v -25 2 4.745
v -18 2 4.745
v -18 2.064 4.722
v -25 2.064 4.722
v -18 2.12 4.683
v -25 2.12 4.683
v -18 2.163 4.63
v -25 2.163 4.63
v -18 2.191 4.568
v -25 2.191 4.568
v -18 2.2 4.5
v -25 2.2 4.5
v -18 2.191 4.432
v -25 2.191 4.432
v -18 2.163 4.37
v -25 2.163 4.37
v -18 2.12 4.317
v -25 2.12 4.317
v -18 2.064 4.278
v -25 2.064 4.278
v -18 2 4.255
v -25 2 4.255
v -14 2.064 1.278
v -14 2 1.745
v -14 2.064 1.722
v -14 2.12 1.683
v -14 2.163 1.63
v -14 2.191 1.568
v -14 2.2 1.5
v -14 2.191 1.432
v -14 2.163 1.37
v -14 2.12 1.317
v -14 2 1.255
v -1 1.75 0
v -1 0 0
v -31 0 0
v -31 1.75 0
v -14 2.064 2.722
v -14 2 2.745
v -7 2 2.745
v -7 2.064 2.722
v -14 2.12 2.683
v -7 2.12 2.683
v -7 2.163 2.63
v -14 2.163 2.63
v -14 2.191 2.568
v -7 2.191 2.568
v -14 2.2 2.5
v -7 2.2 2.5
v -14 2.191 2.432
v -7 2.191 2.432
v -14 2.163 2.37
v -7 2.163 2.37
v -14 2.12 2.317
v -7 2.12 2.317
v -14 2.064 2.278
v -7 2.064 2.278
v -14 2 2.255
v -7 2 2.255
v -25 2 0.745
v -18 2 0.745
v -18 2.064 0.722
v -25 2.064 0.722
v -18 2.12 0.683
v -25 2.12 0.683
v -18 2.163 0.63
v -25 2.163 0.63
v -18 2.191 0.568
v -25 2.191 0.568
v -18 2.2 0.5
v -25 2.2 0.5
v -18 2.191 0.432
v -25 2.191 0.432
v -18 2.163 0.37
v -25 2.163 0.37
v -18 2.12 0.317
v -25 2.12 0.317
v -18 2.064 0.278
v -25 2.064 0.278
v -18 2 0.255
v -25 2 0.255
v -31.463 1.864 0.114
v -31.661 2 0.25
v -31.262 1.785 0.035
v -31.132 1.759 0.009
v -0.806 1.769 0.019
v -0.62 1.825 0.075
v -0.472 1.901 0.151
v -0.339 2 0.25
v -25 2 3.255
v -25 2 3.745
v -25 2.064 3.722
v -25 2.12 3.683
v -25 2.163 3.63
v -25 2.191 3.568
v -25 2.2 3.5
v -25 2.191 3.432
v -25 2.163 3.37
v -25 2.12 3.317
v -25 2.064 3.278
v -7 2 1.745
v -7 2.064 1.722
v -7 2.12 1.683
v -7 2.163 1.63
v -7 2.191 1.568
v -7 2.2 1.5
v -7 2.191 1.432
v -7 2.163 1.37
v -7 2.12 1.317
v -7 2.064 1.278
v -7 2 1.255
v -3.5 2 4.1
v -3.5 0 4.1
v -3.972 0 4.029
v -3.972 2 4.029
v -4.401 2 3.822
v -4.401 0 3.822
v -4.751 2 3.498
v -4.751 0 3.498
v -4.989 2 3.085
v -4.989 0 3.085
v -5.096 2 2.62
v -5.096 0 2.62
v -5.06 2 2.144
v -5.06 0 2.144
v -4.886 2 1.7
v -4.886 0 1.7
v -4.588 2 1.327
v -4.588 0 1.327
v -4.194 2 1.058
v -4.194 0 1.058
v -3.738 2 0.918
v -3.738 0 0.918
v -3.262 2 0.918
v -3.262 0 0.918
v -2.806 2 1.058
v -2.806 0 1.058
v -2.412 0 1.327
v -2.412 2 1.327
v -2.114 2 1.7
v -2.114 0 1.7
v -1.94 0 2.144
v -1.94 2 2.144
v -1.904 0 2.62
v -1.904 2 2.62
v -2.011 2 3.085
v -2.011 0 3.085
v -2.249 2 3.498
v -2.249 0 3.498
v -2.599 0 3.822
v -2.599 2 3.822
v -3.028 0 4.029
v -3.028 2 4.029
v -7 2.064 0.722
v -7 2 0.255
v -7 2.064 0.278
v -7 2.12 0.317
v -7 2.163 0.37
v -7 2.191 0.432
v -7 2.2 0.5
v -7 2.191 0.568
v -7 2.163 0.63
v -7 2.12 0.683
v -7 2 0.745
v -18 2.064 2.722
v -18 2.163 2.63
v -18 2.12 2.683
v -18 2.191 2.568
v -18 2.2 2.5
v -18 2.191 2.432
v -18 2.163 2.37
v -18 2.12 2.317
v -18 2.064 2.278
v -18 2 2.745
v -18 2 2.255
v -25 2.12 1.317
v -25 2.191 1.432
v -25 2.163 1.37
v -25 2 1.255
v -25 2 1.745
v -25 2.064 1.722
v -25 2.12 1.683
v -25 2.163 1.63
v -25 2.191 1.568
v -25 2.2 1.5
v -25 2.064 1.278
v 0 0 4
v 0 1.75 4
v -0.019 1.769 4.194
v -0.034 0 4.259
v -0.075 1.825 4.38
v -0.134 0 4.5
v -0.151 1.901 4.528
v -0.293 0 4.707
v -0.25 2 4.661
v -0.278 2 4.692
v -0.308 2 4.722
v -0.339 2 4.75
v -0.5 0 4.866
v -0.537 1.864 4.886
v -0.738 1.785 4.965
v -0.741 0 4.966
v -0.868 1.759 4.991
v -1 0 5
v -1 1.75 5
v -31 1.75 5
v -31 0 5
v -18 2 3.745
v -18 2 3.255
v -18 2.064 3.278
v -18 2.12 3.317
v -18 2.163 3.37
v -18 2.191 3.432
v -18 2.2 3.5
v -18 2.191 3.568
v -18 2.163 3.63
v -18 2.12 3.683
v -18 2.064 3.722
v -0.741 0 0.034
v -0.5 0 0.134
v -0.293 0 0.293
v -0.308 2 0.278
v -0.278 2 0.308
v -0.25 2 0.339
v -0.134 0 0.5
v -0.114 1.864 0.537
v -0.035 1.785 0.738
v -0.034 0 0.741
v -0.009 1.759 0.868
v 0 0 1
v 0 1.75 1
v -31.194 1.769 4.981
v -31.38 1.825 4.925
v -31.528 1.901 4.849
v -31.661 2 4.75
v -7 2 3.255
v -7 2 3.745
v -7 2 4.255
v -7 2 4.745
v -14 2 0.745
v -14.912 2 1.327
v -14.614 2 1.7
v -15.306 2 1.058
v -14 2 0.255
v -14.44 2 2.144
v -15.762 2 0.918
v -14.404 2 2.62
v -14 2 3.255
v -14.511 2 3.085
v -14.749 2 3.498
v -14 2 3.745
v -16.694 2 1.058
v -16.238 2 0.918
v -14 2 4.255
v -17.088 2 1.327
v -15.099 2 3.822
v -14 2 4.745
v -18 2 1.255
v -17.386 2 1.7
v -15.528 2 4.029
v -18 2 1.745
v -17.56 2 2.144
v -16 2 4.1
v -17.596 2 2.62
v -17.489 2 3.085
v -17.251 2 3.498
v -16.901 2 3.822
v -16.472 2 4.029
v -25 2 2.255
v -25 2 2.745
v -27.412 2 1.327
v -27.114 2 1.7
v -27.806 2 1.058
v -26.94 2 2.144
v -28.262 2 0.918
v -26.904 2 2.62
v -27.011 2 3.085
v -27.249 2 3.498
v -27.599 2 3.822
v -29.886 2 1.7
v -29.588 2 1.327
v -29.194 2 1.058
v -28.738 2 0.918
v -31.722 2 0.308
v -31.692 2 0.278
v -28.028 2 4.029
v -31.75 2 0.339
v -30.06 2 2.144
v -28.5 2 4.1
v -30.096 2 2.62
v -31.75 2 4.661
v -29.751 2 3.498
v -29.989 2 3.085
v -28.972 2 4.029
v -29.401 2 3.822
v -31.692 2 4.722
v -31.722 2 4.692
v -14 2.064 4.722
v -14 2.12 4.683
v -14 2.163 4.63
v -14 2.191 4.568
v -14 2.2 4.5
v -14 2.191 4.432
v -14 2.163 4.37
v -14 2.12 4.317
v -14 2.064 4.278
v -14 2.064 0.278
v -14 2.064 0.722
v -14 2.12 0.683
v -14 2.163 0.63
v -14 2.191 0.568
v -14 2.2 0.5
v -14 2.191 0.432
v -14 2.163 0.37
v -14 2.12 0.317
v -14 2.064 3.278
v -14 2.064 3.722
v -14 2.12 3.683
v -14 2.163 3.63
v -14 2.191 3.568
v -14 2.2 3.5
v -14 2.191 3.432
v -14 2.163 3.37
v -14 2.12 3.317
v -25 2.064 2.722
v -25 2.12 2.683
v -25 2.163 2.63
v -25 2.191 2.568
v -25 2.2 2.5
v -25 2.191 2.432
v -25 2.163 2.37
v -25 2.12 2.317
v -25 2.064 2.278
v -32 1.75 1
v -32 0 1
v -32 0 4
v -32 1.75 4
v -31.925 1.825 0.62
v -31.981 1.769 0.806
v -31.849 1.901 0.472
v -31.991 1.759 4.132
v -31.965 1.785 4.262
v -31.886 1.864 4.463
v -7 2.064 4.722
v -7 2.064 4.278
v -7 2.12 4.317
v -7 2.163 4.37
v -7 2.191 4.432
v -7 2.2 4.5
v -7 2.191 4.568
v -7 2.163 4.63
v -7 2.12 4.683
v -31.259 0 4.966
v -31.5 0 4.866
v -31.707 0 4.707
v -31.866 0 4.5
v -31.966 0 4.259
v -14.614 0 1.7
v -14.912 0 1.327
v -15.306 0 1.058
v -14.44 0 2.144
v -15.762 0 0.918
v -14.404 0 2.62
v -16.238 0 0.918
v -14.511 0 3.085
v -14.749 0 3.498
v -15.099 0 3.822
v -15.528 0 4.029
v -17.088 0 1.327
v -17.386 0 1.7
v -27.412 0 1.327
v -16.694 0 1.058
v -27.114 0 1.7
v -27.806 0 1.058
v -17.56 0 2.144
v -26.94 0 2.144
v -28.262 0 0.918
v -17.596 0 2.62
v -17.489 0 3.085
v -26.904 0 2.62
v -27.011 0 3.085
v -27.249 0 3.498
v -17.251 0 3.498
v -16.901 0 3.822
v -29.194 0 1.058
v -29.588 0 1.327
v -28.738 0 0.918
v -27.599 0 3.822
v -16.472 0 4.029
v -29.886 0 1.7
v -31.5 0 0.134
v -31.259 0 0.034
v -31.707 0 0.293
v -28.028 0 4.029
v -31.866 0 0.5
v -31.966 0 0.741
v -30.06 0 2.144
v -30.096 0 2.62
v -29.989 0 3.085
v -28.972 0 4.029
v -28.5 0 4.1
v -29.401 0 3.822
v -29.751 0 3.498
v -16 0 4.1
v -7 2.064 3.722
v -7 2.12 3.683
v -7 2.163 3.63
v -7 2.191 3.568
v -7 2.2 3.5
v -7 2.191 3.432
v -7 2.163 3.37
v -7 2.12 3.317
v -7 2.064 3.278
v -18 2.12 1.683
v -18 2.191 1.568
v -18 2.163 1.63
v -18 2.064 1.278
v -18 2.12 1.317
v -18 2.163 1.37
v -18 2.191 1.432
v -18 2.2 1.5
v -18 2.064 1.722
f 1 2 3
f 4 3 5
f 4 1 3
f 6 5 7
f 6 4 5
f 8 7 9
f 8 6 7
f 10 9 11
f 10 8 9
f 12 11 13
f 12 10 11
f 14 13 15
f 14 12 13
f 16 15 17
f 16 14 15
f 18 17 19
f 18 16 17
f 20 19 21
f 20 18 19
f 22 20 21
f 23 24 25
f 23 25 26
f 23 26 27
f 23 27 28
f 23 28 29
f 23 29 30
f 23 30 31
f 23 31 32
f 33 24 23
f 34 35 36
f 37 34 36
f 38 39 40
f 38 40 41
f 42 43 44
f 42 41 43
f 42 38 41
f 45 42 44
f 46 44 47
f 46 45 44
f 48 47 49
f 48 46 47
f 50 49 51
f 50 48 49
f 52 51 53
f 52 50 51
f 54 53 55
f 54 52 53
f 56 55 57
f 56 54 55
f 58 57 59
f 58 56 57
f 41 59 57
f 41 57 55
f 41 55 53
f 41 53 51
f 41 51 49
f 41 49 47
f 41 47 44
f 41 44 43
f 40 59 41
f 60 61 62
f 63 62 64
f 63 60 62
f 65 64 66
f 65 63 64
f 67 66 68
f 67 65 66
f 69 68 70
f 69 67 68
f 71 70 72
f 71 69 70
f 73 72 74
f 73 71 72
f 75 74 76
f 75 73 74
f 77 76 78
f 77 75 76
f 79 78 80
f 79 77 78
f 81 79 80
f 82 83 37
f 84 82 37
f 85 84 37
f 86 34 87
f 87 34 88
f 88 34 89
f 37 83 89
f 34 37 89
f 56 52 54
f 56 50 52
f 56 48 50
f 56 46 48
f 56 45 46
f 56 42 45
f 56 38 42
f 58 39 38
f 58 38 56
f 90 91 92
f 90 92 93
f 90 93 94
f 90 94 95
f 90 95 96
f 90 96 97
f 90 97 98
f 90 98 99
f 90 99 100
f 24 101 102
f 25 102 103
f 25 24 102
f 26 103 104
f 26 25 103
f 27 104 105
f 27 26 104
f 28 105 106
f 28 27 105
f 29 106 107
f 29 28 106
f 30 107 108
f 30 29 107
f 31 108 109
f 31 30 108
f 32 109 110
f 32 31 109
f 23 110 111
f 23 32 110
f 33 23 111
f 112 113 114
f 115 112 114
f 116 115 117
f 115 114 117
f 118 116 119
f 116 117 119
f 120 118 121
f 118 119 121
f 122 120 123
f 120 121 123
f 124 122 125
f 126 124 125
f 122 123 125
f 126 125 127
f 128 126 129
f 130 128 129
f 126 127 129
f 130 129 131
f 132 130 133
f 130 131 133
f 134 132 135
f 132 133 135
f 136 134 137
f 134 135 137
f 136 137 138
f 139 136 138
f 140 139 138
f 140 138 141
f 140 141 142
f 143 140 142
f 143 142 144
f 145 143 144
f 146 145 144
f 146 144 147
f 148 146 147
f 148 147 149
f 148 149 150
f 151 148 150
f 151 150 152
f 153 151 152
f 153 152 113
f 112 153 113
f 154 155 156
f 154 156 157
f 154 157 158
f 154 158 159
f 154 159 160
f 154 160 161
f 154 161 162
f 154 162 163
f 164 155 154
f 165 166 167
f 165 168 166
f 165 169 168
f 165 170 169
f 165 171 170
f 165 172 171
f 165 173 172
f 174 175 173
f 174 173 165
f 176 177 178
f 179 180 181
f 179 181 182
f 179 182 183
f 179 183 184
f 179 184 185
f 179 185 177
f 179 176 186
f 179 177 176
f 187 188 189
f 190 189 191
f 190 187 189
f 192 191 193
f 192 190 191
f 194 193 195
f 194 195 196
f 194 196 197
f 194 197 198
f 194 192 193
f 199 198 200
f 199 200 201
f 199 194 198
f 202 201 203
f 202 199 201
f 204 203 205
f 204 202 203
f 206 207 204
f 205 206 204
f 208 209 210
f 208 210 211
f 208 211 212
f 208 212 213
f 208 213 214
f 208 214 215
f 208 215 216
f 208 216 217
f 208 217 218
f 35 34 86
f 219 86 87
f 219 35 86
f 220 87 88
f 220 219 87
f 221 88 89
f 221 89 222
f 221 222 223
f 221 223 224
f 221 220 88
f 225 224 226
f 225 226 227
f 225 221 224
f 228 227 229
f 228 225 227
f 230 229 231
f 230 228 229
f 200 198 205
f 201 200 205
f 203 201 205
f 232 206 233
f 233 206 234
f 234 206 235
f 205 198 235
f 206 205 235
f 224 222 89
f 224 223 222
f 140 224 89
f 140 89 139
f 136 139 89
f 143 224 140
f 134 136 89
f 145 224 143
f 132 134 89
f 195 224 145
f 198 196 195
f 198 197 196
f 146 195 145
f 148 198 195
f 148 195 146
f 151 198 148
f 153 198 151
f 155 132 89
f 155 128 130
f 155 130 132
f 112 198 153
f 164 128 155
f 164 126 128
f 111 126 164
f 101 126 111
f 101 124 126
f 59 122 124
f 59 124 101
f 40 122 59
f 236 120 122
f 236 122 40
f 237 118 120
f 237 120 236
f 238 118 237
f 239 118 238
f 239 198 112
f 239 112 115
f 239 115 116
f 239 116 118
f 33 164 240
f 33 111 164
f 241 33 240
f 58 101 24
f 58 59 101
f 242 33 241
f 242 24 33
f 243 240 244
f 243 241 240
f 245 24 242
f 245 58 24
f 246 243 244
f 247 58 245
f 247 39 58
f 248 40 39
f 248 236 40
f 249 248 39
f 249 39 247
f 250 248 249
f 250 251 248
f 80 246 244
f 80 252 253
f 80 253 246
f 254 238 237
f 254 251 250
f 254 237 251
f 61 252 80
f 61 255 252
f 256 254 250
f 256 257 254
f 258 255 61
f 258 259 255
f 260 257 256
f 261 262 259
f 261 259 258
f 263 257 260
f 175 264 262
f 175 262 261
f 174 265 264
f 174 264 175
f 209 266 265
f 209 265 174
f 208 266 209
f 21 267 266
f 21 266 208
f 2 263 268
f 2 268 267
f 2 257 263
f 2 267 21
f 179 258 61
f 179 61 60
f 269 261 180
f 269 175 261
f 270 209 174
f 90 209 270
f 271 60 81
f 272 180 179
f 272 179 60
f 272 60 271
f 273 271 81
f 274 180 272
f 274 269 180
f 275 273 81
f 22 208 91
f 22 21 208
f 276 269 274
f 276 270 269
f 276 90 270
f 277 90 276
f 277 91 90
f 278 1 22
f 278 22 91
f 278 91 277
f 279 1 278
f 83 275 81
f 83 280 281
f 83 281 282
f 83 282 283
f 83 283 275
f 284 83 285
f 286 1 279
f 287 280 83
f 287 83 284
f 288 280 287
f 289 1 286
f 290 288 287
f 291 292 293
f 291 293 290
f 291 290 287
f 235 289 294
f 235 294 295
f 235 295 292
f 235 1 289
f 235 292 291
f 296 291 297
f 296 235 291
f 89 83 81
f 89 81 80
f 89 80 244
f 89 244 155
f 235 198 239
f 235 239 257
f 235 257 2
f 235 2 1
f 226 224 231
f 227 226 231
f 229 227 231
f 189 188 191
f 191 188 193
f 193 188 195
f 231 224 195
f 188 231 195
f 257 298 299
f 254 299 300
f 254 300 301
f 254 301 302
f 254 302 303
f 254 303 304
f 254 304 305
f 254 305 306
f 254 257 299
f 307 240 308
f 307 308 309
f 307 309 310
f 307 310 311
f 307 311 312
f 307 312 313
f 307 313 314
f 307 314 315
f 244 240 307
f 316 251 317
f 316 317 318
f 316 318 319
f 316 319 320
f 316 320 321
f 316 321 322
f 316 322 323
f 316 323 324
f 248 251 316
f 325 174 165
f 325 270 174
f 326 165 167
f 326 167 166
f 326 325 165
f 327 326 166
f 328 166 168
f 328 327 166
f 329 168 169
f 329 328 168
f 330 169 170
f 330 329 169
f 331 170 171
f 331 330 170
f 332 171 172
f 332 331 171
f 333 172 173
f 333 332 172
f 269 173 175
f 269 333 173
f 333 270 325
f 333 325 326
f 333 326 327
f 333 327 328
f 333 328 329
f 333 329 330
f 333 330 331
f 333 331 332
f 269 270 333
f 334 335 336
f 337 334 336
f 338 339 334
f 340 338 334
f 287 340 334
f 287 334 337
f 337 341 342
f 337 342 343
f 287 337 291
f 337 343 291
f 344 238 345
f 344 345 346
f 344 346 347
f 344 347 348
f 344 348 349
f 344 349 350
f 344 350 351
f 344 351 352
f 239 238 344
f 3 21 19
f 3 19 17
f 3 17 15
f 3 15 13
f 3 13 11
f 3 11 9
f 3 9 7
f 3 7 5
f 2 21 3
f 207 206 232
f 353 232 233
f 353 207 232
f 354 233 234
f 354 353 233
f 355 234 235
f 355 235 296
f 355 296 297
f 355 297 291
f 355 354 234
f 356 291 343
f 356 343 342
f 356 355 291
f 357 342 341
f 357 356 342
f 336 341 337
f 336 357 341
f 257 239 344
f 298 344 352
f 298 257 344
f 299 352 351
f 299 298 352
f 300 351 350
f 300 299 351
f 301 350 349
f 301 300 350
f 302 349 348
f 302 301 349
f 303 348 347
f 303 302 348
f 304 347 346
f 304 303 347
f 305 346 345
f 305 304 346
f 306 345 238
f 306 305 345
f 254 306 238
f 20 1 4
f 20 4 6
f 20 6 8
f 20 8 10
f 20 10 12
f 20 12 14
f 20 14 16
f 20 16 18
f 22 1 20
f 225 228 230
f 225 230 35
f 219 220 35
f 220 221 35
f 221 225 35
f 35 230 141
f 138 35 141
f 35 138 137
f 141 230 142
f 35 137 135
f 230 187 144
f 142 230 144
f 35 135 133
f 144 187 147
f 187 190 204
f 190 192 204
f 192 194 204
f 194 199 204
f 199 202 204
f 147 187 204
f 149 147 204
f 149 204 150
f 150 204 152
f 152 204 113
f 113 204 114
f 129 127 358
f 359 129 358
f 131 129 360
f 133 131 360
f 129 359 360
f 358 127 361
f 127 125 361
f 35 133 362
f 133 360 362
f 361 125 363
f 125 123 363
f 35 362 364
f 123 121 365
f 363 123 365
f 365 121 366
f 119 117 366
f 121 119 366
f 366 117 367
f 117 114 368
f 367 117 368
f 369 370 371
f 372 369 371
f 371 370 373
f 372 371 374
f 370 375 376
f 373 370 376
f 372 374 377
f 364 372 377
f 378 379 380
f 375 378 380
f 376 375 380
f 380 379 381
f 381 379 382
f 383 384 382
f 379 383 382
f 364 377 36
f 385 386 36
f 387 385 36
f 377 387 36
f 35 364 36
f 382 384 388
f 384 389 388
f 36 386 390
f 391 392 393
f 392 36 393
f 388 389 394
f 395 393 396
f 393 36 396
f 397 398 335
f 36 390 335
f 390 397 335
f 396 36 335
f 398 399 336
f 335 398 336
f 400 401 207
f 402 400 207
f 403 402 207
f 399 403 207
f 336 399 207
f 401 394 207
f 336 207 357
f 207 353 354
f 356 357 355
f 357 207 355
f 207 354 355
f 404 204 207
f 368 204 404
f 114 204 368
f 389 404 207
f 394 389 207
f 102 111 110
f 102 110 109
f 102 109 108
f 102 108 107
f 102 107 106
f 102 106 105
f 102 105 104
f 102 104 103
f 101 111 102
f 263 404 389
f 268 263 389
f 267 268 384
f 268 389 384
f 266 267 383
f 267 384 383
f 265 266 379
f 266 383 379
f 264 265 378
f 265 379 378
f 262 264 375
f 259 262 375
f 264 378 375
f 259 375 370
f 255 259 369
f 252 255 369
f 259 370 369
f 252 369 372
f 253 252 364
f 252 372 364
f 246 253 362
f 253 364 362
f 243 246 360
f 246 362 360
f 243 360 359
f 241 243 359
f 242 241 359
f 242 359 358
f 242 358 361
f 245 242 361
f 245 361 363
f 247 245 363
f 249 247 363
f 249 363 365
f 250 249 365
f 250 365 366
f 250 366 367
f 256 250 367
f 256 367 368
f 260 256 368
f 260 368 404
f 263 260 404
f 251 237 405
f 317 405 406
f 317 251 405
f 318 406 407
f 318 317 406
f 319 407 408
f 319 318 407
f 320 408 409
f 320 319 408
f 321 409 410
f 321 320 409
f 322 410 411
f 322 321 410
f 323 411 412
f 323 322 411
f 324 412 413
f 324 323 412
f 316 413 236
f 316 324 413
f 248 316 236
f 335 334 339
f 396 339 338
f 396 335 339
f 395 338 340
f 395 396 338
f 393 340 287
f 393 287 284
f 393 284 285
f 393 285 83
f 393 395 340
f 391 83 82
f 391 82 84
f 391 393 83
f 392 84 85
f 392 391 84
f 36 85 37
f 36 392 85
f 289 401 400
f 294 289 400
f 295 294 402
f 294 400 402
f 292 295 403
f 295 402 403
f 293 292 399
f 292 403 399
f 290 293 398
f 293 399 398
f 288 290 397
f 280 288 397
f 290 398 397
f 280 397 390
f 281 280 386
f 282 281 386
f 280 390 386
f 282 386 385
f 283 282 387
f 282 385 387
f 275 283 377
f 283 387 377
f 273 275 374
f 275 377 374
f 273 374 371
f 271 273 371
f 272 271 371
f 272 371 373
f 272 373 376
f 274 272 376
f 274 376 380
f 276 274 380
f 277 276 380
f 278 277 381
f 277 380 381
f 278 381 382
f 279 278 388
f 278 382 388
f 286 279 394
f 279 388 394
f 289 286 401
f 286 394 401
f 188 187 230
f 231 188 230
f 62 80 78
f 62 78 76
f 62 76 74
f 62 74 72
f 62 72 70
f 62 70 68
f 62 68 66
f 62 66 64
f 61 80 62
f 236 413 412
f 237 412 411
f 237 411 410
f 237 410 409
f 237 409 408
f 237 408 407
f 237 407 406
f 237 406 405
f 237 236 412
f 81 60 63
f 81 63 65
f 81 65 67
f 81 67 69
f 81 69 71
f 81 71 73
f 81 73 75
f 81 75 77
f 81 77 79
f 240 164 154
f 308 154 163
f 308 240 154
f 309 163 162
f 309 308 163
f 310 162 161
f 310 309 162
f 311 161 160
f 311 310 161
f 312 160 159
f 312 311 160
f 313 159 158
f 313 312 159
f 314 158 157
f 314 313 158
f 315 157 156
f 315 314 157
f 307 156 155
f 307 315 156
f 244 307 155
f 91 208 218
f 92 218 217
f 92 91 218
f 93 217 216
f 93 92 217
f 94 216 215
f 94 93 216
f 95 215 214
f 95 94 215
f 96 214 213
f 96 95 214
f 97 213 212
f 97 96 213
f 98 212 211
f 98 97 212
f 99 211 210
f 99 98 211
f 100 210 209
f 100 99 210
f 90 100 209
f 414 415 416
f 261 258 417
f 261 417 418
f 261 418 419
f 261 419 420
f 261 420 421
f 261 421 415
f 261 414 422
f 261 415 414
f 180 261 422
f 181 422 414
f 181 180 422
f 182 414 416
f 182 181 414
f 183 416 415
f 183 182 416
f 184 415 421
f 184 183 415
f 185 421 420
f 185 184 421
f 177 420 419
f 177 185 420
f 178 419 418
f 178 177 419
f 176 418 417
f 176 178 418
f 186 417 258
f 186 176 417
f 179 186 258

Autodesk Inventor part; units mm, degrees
ref_plane "YZ Plane" through (0, 0, 0) normal (1, 0, 0) x (0, 1, 0)
ref_plane "XZ Plane" through (0, 0, 0) normal (0, 1, 0) x (-1, 0, 0)
ref_plane "XY Plane" through (0, 0, 0) normal (0, 0, 1) x (1, 0, 0)
sketch "Skizze1" plane through (0, 0, 0) normal (0, 1, 0) x (-1, 0, 0)
  line L0 (0, 0) -> (32, 0)
  line L1 (32, 0) -> (32, 5)
  line L2 (32, 5) -> (0, 5)
  line L3 (0, 5) -> (0, 0)
  dimension "d0" = 32
  dimension "d1" = 5
extrude "Extrusion1" add sketch "Skizze1" along normal blind 2
ref_plane "Arbeitsebene1" through (-32, 0, 2.5) normal (0, 0, 1) x (1, 0, 0)
ref_plane "Arbeitsebene2" through (-16, 0, 5) normal (1, 0, 0) x (0, 0, -1)
sketch "Skizze2" plane through (0, 2, 0) normal (0, 1, 0) x (1, 0, 0)
  line L0 (6.4, -2.5) -> (-38.4, -2.5) projected
  line L1 (-16, 1) -> (-16, -6) projected
  point P0 (0, 0)
  point P1 (-28.5, -2.5)
  point P2 (-16, -2.5)
  point P3 (-3.5, -2.5)
  dimension "d4" = 25
  dimension "d5" = 12.5
hole "Bohrung1" at (-28.5, 2, 2.5) at (-16, 2, 2.5) at (-3.5, 2, 2.5) direction (0, -1, 0) diameter 3.2 end through all
sketch "Skizze3" plane through (0, 2, 0) normal (0, 1, 0) x (1, 0, 0)
  line L0 (-18, -4.75) -> (-25, -4.75)
  line L1 (-25, -4.75) -> (-25, -4.25)
  line L2 (-25, -4.25) -> (-18, -4.25)
  line L3 (-18, -4.25) -> (-18, -4.75)
  line L4 (-18, -3.75) -> (-25, -3.75)
  line L5 (-25, -3.75) -> (-25, -3.25)
  line L6 (-25, -3.25) -> (-18, -3.25)
  line L7 (-18, -3.25) -> (-18, -3.75)
  line L8 (-18, -2.75) -> (-25, -2.75)
  line L9 (-25, -2.75) -> (-25, -2.25)
  line L10 (-25, -2.25) -> (-18, -2.25)
  line L11 (-18, -2.25) -> (-18, -2.75)
  line L12 (-18, -1.75) -> (-25, -1.75)
  line L13 (-25, -1.75) -> (-25, -1.25)
  line L14 (-25, -1.25) -> (-18, -1.25)
  line L15 (-18, -1.25) -> (-18, -1.75)
  line L16 (-18, -0.75) -> (-25, -0.75)
  line L17 (-25, -0.75) -> (-25, -0.25)
  line L18 (-25, -0.25) -> (-18, -0.25)
  line L19 (-18, -0.25) -> (-18, -0.75)
  line L20 (-16, 1) -> (-16, -6) projected
  line L21 (-32, -5) -> (0, -5) projected
  line L22 (0, 0) -> (-32, 0) projected
  dimension "d13" = 2
  dimension "d14" = 7
  dimension "d15" = 0.5
  dimension "d16" = 0.5
  dimension "d17" = 0.5
  dimension "d18" = 0.5
  dimension "d19" = 0.5
  dimension "d20" = 0.25
  dimension "d21" = 0.25
extrude "Extrusion2" add sketch "Skizze3" along normal blind 0.2
fillet "Rundung1" radius 0.25 10 edges at (-21.5, 2.2, 4.25) (-21.5, 2.2, 4.75) (-21.5, 2.2, 3.75) (-21.5, 2.2, 3.25) (-21.5, 2.2, 2.75) (-21.5, 2.2, 2.25) (-21.5, 2.2, 1.75) (-21.5, 2.2, 1.25) (-21.5, 2.2, 0.75) (-21.5, 2.2, 0.25)
mirror "Spiegeln1" about plane through (-16, 0, 5) normal (1, 0, 0) of "Rundung1", "Extrusion2"
chamfer "Fase1" distance 0.25 angle 45 4 edges at (-16, 2, 5) (-16, 2, 0) (0, 2, 2.5) (-32, 2, 2.5)
fillet "Rundung2" radius 1 4 edges at (-32, 0.875, 5) (-32, 0.875, 0) (0, 0.875, 5) (0, 0.875, 0)
equation "\"d5\" = 0.5 * d4"
equation "\"d16\" = d15"
equation "\"d17\" = d16"
equation "\"d18\" = d17"
equation "\"d19\" = d17"
properties part number "x_carriage_aio_clamp"
